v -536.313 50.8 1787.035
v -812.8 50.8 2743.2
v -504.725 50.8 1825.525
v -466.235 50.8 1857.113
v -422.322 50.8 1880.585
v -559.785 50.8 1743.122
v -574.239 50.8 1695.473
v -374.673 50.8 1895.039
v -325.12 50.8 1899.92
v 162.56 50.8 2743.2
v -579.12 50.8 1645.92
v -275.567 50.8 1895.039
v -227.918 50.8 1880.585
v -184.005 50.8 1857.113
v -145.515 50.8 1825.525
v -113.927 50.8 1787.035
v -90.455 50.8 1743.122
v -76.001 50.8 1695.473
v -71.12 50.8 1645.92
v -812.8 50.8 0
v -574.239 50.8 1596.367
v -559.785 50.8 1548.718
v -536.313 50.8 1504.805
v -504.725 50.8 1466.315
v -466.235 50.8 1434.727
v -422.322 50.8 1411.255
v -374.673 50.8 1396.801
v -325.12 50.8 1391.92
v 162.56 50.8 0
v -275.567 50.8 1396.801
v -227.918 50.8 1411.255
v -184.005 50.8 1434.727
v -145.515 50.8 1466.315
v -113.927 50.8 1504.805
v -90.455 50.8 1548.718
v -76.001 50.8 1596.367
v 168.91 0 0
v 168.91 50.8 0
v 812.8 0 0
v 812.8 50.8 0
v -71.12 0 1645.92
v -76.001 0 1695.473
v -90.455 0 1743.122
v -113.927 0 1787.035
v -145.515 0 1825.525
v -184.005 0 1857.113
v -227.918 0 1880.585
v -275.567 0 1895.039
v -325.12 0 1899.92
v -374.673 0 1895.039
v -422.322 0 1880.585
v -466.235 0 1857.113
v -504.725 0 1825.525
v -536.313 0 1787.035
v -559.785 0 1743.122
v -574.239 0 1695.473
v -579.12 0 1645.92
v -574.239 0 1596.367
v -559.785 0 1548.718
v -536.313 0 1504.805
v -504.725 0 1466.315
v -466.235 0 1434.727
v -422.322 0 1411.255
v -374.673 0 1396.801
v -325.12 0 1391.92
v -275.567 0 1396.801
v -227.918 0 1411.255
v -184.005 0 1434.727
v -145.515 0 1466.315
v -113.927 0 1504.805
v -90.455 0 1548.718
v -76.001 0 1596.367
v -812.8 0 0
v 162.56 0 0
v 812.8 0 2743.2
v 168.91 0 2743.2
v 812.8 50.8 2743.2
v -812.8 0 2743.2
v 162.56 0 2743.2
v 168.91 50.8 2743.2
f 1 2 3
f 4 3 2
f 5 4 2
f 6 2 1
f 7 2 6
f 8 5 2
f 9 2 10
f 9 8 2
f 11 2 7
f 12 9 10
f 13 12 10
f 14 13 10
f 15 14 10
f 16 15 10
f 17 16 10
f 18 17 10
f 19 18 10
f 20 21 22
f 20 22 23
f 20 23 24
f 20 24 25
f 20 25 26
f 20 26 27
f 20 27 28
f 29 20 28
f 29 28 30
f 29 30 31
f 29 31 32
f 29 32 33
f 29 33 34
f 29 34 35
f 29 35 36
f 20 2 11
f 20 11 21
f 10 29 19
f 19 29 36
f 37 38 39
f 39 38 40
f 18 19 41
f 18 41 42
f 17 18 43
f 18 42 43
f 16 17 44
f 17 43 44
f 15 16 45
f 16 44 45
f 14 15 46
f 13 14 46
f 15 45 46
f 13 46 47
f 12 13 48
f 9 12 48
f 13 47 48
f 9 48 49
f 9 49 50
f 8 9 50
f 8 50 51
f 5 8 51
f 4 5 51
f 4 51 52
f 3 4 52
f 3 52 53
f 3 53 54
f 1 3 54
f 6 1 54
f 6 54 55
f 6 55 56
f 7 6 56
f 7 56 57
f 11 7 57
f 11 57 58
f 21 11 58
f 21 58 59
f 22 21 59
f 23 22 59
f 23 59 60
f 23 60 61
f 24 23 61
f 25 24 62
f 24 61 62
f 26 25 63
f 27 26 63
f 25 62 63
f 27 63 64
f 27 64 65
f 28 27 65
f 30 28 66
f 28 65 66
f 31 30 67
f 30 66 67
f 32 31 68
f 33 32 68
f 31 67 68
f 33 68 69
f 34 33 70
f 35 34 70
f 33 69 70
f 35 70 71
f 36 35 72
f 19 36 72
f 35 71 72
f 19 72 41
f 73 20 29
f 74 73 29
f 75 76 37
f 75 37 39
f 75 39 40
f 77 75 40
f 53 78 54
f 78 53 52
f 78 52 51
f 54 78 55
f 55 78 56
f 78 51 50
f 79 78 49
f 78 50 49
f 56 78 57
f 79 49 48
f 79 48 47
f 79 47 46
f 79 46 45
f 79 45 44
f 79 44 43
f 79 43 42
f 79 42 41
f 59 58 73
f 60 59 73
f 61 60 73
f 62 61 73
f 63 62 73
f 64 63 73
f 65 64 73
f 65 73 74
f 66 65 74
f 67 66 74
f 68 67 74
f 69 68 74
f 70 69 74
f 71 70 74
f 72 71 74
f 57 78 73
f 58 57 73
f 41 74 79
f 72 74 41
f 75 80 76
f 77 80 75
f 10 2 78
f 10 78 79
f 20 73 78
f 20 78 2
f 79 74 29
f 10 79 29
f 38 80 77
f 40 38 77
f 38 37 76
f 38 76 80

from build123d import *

# Parameters (mm, degrees)
F1_W     = 975.36
F1_H     = 50.8
F2_DEPTH = 2743.2
F1_W_2   = 643.89
F3_R     = 254
F4_DEPTH = 50.801


# Not quite as in the source:
# - a variable given as a bare number and used for a length is read in inches; the dataset says mm whatever the document's units were


with BuildPart() as f2:
    # F1 (on Top) → F2 (new body)
    with BuildSketch(Plane.XY):
        with Locations((-325.12, 25.4)):
            Rectangle(F1_W, F1_H)
    extrude(amount=F2_DEPTH)

    # F3 (on face) → F4 (cut, through all)
    with BuildSketch(Plane.XZ):
        with Locations((-325.12, 1645.92)):
            Circle(F3_R)
    extrude(amount=-F4_DEPTH, mode=Mode.SUBTRACT)


with BuildPart() as f2b:
    # F1 (on Top) → F2, piece 2 (new body)
    with BuildSketch(Plane.XY):
        with Locations((490.855, 25.4)):
            Rectangle(F1_W_2, F1_H)
    extrude(amount=F2_DEPTH)


solid = Compound([f2.part, f2b.part])
